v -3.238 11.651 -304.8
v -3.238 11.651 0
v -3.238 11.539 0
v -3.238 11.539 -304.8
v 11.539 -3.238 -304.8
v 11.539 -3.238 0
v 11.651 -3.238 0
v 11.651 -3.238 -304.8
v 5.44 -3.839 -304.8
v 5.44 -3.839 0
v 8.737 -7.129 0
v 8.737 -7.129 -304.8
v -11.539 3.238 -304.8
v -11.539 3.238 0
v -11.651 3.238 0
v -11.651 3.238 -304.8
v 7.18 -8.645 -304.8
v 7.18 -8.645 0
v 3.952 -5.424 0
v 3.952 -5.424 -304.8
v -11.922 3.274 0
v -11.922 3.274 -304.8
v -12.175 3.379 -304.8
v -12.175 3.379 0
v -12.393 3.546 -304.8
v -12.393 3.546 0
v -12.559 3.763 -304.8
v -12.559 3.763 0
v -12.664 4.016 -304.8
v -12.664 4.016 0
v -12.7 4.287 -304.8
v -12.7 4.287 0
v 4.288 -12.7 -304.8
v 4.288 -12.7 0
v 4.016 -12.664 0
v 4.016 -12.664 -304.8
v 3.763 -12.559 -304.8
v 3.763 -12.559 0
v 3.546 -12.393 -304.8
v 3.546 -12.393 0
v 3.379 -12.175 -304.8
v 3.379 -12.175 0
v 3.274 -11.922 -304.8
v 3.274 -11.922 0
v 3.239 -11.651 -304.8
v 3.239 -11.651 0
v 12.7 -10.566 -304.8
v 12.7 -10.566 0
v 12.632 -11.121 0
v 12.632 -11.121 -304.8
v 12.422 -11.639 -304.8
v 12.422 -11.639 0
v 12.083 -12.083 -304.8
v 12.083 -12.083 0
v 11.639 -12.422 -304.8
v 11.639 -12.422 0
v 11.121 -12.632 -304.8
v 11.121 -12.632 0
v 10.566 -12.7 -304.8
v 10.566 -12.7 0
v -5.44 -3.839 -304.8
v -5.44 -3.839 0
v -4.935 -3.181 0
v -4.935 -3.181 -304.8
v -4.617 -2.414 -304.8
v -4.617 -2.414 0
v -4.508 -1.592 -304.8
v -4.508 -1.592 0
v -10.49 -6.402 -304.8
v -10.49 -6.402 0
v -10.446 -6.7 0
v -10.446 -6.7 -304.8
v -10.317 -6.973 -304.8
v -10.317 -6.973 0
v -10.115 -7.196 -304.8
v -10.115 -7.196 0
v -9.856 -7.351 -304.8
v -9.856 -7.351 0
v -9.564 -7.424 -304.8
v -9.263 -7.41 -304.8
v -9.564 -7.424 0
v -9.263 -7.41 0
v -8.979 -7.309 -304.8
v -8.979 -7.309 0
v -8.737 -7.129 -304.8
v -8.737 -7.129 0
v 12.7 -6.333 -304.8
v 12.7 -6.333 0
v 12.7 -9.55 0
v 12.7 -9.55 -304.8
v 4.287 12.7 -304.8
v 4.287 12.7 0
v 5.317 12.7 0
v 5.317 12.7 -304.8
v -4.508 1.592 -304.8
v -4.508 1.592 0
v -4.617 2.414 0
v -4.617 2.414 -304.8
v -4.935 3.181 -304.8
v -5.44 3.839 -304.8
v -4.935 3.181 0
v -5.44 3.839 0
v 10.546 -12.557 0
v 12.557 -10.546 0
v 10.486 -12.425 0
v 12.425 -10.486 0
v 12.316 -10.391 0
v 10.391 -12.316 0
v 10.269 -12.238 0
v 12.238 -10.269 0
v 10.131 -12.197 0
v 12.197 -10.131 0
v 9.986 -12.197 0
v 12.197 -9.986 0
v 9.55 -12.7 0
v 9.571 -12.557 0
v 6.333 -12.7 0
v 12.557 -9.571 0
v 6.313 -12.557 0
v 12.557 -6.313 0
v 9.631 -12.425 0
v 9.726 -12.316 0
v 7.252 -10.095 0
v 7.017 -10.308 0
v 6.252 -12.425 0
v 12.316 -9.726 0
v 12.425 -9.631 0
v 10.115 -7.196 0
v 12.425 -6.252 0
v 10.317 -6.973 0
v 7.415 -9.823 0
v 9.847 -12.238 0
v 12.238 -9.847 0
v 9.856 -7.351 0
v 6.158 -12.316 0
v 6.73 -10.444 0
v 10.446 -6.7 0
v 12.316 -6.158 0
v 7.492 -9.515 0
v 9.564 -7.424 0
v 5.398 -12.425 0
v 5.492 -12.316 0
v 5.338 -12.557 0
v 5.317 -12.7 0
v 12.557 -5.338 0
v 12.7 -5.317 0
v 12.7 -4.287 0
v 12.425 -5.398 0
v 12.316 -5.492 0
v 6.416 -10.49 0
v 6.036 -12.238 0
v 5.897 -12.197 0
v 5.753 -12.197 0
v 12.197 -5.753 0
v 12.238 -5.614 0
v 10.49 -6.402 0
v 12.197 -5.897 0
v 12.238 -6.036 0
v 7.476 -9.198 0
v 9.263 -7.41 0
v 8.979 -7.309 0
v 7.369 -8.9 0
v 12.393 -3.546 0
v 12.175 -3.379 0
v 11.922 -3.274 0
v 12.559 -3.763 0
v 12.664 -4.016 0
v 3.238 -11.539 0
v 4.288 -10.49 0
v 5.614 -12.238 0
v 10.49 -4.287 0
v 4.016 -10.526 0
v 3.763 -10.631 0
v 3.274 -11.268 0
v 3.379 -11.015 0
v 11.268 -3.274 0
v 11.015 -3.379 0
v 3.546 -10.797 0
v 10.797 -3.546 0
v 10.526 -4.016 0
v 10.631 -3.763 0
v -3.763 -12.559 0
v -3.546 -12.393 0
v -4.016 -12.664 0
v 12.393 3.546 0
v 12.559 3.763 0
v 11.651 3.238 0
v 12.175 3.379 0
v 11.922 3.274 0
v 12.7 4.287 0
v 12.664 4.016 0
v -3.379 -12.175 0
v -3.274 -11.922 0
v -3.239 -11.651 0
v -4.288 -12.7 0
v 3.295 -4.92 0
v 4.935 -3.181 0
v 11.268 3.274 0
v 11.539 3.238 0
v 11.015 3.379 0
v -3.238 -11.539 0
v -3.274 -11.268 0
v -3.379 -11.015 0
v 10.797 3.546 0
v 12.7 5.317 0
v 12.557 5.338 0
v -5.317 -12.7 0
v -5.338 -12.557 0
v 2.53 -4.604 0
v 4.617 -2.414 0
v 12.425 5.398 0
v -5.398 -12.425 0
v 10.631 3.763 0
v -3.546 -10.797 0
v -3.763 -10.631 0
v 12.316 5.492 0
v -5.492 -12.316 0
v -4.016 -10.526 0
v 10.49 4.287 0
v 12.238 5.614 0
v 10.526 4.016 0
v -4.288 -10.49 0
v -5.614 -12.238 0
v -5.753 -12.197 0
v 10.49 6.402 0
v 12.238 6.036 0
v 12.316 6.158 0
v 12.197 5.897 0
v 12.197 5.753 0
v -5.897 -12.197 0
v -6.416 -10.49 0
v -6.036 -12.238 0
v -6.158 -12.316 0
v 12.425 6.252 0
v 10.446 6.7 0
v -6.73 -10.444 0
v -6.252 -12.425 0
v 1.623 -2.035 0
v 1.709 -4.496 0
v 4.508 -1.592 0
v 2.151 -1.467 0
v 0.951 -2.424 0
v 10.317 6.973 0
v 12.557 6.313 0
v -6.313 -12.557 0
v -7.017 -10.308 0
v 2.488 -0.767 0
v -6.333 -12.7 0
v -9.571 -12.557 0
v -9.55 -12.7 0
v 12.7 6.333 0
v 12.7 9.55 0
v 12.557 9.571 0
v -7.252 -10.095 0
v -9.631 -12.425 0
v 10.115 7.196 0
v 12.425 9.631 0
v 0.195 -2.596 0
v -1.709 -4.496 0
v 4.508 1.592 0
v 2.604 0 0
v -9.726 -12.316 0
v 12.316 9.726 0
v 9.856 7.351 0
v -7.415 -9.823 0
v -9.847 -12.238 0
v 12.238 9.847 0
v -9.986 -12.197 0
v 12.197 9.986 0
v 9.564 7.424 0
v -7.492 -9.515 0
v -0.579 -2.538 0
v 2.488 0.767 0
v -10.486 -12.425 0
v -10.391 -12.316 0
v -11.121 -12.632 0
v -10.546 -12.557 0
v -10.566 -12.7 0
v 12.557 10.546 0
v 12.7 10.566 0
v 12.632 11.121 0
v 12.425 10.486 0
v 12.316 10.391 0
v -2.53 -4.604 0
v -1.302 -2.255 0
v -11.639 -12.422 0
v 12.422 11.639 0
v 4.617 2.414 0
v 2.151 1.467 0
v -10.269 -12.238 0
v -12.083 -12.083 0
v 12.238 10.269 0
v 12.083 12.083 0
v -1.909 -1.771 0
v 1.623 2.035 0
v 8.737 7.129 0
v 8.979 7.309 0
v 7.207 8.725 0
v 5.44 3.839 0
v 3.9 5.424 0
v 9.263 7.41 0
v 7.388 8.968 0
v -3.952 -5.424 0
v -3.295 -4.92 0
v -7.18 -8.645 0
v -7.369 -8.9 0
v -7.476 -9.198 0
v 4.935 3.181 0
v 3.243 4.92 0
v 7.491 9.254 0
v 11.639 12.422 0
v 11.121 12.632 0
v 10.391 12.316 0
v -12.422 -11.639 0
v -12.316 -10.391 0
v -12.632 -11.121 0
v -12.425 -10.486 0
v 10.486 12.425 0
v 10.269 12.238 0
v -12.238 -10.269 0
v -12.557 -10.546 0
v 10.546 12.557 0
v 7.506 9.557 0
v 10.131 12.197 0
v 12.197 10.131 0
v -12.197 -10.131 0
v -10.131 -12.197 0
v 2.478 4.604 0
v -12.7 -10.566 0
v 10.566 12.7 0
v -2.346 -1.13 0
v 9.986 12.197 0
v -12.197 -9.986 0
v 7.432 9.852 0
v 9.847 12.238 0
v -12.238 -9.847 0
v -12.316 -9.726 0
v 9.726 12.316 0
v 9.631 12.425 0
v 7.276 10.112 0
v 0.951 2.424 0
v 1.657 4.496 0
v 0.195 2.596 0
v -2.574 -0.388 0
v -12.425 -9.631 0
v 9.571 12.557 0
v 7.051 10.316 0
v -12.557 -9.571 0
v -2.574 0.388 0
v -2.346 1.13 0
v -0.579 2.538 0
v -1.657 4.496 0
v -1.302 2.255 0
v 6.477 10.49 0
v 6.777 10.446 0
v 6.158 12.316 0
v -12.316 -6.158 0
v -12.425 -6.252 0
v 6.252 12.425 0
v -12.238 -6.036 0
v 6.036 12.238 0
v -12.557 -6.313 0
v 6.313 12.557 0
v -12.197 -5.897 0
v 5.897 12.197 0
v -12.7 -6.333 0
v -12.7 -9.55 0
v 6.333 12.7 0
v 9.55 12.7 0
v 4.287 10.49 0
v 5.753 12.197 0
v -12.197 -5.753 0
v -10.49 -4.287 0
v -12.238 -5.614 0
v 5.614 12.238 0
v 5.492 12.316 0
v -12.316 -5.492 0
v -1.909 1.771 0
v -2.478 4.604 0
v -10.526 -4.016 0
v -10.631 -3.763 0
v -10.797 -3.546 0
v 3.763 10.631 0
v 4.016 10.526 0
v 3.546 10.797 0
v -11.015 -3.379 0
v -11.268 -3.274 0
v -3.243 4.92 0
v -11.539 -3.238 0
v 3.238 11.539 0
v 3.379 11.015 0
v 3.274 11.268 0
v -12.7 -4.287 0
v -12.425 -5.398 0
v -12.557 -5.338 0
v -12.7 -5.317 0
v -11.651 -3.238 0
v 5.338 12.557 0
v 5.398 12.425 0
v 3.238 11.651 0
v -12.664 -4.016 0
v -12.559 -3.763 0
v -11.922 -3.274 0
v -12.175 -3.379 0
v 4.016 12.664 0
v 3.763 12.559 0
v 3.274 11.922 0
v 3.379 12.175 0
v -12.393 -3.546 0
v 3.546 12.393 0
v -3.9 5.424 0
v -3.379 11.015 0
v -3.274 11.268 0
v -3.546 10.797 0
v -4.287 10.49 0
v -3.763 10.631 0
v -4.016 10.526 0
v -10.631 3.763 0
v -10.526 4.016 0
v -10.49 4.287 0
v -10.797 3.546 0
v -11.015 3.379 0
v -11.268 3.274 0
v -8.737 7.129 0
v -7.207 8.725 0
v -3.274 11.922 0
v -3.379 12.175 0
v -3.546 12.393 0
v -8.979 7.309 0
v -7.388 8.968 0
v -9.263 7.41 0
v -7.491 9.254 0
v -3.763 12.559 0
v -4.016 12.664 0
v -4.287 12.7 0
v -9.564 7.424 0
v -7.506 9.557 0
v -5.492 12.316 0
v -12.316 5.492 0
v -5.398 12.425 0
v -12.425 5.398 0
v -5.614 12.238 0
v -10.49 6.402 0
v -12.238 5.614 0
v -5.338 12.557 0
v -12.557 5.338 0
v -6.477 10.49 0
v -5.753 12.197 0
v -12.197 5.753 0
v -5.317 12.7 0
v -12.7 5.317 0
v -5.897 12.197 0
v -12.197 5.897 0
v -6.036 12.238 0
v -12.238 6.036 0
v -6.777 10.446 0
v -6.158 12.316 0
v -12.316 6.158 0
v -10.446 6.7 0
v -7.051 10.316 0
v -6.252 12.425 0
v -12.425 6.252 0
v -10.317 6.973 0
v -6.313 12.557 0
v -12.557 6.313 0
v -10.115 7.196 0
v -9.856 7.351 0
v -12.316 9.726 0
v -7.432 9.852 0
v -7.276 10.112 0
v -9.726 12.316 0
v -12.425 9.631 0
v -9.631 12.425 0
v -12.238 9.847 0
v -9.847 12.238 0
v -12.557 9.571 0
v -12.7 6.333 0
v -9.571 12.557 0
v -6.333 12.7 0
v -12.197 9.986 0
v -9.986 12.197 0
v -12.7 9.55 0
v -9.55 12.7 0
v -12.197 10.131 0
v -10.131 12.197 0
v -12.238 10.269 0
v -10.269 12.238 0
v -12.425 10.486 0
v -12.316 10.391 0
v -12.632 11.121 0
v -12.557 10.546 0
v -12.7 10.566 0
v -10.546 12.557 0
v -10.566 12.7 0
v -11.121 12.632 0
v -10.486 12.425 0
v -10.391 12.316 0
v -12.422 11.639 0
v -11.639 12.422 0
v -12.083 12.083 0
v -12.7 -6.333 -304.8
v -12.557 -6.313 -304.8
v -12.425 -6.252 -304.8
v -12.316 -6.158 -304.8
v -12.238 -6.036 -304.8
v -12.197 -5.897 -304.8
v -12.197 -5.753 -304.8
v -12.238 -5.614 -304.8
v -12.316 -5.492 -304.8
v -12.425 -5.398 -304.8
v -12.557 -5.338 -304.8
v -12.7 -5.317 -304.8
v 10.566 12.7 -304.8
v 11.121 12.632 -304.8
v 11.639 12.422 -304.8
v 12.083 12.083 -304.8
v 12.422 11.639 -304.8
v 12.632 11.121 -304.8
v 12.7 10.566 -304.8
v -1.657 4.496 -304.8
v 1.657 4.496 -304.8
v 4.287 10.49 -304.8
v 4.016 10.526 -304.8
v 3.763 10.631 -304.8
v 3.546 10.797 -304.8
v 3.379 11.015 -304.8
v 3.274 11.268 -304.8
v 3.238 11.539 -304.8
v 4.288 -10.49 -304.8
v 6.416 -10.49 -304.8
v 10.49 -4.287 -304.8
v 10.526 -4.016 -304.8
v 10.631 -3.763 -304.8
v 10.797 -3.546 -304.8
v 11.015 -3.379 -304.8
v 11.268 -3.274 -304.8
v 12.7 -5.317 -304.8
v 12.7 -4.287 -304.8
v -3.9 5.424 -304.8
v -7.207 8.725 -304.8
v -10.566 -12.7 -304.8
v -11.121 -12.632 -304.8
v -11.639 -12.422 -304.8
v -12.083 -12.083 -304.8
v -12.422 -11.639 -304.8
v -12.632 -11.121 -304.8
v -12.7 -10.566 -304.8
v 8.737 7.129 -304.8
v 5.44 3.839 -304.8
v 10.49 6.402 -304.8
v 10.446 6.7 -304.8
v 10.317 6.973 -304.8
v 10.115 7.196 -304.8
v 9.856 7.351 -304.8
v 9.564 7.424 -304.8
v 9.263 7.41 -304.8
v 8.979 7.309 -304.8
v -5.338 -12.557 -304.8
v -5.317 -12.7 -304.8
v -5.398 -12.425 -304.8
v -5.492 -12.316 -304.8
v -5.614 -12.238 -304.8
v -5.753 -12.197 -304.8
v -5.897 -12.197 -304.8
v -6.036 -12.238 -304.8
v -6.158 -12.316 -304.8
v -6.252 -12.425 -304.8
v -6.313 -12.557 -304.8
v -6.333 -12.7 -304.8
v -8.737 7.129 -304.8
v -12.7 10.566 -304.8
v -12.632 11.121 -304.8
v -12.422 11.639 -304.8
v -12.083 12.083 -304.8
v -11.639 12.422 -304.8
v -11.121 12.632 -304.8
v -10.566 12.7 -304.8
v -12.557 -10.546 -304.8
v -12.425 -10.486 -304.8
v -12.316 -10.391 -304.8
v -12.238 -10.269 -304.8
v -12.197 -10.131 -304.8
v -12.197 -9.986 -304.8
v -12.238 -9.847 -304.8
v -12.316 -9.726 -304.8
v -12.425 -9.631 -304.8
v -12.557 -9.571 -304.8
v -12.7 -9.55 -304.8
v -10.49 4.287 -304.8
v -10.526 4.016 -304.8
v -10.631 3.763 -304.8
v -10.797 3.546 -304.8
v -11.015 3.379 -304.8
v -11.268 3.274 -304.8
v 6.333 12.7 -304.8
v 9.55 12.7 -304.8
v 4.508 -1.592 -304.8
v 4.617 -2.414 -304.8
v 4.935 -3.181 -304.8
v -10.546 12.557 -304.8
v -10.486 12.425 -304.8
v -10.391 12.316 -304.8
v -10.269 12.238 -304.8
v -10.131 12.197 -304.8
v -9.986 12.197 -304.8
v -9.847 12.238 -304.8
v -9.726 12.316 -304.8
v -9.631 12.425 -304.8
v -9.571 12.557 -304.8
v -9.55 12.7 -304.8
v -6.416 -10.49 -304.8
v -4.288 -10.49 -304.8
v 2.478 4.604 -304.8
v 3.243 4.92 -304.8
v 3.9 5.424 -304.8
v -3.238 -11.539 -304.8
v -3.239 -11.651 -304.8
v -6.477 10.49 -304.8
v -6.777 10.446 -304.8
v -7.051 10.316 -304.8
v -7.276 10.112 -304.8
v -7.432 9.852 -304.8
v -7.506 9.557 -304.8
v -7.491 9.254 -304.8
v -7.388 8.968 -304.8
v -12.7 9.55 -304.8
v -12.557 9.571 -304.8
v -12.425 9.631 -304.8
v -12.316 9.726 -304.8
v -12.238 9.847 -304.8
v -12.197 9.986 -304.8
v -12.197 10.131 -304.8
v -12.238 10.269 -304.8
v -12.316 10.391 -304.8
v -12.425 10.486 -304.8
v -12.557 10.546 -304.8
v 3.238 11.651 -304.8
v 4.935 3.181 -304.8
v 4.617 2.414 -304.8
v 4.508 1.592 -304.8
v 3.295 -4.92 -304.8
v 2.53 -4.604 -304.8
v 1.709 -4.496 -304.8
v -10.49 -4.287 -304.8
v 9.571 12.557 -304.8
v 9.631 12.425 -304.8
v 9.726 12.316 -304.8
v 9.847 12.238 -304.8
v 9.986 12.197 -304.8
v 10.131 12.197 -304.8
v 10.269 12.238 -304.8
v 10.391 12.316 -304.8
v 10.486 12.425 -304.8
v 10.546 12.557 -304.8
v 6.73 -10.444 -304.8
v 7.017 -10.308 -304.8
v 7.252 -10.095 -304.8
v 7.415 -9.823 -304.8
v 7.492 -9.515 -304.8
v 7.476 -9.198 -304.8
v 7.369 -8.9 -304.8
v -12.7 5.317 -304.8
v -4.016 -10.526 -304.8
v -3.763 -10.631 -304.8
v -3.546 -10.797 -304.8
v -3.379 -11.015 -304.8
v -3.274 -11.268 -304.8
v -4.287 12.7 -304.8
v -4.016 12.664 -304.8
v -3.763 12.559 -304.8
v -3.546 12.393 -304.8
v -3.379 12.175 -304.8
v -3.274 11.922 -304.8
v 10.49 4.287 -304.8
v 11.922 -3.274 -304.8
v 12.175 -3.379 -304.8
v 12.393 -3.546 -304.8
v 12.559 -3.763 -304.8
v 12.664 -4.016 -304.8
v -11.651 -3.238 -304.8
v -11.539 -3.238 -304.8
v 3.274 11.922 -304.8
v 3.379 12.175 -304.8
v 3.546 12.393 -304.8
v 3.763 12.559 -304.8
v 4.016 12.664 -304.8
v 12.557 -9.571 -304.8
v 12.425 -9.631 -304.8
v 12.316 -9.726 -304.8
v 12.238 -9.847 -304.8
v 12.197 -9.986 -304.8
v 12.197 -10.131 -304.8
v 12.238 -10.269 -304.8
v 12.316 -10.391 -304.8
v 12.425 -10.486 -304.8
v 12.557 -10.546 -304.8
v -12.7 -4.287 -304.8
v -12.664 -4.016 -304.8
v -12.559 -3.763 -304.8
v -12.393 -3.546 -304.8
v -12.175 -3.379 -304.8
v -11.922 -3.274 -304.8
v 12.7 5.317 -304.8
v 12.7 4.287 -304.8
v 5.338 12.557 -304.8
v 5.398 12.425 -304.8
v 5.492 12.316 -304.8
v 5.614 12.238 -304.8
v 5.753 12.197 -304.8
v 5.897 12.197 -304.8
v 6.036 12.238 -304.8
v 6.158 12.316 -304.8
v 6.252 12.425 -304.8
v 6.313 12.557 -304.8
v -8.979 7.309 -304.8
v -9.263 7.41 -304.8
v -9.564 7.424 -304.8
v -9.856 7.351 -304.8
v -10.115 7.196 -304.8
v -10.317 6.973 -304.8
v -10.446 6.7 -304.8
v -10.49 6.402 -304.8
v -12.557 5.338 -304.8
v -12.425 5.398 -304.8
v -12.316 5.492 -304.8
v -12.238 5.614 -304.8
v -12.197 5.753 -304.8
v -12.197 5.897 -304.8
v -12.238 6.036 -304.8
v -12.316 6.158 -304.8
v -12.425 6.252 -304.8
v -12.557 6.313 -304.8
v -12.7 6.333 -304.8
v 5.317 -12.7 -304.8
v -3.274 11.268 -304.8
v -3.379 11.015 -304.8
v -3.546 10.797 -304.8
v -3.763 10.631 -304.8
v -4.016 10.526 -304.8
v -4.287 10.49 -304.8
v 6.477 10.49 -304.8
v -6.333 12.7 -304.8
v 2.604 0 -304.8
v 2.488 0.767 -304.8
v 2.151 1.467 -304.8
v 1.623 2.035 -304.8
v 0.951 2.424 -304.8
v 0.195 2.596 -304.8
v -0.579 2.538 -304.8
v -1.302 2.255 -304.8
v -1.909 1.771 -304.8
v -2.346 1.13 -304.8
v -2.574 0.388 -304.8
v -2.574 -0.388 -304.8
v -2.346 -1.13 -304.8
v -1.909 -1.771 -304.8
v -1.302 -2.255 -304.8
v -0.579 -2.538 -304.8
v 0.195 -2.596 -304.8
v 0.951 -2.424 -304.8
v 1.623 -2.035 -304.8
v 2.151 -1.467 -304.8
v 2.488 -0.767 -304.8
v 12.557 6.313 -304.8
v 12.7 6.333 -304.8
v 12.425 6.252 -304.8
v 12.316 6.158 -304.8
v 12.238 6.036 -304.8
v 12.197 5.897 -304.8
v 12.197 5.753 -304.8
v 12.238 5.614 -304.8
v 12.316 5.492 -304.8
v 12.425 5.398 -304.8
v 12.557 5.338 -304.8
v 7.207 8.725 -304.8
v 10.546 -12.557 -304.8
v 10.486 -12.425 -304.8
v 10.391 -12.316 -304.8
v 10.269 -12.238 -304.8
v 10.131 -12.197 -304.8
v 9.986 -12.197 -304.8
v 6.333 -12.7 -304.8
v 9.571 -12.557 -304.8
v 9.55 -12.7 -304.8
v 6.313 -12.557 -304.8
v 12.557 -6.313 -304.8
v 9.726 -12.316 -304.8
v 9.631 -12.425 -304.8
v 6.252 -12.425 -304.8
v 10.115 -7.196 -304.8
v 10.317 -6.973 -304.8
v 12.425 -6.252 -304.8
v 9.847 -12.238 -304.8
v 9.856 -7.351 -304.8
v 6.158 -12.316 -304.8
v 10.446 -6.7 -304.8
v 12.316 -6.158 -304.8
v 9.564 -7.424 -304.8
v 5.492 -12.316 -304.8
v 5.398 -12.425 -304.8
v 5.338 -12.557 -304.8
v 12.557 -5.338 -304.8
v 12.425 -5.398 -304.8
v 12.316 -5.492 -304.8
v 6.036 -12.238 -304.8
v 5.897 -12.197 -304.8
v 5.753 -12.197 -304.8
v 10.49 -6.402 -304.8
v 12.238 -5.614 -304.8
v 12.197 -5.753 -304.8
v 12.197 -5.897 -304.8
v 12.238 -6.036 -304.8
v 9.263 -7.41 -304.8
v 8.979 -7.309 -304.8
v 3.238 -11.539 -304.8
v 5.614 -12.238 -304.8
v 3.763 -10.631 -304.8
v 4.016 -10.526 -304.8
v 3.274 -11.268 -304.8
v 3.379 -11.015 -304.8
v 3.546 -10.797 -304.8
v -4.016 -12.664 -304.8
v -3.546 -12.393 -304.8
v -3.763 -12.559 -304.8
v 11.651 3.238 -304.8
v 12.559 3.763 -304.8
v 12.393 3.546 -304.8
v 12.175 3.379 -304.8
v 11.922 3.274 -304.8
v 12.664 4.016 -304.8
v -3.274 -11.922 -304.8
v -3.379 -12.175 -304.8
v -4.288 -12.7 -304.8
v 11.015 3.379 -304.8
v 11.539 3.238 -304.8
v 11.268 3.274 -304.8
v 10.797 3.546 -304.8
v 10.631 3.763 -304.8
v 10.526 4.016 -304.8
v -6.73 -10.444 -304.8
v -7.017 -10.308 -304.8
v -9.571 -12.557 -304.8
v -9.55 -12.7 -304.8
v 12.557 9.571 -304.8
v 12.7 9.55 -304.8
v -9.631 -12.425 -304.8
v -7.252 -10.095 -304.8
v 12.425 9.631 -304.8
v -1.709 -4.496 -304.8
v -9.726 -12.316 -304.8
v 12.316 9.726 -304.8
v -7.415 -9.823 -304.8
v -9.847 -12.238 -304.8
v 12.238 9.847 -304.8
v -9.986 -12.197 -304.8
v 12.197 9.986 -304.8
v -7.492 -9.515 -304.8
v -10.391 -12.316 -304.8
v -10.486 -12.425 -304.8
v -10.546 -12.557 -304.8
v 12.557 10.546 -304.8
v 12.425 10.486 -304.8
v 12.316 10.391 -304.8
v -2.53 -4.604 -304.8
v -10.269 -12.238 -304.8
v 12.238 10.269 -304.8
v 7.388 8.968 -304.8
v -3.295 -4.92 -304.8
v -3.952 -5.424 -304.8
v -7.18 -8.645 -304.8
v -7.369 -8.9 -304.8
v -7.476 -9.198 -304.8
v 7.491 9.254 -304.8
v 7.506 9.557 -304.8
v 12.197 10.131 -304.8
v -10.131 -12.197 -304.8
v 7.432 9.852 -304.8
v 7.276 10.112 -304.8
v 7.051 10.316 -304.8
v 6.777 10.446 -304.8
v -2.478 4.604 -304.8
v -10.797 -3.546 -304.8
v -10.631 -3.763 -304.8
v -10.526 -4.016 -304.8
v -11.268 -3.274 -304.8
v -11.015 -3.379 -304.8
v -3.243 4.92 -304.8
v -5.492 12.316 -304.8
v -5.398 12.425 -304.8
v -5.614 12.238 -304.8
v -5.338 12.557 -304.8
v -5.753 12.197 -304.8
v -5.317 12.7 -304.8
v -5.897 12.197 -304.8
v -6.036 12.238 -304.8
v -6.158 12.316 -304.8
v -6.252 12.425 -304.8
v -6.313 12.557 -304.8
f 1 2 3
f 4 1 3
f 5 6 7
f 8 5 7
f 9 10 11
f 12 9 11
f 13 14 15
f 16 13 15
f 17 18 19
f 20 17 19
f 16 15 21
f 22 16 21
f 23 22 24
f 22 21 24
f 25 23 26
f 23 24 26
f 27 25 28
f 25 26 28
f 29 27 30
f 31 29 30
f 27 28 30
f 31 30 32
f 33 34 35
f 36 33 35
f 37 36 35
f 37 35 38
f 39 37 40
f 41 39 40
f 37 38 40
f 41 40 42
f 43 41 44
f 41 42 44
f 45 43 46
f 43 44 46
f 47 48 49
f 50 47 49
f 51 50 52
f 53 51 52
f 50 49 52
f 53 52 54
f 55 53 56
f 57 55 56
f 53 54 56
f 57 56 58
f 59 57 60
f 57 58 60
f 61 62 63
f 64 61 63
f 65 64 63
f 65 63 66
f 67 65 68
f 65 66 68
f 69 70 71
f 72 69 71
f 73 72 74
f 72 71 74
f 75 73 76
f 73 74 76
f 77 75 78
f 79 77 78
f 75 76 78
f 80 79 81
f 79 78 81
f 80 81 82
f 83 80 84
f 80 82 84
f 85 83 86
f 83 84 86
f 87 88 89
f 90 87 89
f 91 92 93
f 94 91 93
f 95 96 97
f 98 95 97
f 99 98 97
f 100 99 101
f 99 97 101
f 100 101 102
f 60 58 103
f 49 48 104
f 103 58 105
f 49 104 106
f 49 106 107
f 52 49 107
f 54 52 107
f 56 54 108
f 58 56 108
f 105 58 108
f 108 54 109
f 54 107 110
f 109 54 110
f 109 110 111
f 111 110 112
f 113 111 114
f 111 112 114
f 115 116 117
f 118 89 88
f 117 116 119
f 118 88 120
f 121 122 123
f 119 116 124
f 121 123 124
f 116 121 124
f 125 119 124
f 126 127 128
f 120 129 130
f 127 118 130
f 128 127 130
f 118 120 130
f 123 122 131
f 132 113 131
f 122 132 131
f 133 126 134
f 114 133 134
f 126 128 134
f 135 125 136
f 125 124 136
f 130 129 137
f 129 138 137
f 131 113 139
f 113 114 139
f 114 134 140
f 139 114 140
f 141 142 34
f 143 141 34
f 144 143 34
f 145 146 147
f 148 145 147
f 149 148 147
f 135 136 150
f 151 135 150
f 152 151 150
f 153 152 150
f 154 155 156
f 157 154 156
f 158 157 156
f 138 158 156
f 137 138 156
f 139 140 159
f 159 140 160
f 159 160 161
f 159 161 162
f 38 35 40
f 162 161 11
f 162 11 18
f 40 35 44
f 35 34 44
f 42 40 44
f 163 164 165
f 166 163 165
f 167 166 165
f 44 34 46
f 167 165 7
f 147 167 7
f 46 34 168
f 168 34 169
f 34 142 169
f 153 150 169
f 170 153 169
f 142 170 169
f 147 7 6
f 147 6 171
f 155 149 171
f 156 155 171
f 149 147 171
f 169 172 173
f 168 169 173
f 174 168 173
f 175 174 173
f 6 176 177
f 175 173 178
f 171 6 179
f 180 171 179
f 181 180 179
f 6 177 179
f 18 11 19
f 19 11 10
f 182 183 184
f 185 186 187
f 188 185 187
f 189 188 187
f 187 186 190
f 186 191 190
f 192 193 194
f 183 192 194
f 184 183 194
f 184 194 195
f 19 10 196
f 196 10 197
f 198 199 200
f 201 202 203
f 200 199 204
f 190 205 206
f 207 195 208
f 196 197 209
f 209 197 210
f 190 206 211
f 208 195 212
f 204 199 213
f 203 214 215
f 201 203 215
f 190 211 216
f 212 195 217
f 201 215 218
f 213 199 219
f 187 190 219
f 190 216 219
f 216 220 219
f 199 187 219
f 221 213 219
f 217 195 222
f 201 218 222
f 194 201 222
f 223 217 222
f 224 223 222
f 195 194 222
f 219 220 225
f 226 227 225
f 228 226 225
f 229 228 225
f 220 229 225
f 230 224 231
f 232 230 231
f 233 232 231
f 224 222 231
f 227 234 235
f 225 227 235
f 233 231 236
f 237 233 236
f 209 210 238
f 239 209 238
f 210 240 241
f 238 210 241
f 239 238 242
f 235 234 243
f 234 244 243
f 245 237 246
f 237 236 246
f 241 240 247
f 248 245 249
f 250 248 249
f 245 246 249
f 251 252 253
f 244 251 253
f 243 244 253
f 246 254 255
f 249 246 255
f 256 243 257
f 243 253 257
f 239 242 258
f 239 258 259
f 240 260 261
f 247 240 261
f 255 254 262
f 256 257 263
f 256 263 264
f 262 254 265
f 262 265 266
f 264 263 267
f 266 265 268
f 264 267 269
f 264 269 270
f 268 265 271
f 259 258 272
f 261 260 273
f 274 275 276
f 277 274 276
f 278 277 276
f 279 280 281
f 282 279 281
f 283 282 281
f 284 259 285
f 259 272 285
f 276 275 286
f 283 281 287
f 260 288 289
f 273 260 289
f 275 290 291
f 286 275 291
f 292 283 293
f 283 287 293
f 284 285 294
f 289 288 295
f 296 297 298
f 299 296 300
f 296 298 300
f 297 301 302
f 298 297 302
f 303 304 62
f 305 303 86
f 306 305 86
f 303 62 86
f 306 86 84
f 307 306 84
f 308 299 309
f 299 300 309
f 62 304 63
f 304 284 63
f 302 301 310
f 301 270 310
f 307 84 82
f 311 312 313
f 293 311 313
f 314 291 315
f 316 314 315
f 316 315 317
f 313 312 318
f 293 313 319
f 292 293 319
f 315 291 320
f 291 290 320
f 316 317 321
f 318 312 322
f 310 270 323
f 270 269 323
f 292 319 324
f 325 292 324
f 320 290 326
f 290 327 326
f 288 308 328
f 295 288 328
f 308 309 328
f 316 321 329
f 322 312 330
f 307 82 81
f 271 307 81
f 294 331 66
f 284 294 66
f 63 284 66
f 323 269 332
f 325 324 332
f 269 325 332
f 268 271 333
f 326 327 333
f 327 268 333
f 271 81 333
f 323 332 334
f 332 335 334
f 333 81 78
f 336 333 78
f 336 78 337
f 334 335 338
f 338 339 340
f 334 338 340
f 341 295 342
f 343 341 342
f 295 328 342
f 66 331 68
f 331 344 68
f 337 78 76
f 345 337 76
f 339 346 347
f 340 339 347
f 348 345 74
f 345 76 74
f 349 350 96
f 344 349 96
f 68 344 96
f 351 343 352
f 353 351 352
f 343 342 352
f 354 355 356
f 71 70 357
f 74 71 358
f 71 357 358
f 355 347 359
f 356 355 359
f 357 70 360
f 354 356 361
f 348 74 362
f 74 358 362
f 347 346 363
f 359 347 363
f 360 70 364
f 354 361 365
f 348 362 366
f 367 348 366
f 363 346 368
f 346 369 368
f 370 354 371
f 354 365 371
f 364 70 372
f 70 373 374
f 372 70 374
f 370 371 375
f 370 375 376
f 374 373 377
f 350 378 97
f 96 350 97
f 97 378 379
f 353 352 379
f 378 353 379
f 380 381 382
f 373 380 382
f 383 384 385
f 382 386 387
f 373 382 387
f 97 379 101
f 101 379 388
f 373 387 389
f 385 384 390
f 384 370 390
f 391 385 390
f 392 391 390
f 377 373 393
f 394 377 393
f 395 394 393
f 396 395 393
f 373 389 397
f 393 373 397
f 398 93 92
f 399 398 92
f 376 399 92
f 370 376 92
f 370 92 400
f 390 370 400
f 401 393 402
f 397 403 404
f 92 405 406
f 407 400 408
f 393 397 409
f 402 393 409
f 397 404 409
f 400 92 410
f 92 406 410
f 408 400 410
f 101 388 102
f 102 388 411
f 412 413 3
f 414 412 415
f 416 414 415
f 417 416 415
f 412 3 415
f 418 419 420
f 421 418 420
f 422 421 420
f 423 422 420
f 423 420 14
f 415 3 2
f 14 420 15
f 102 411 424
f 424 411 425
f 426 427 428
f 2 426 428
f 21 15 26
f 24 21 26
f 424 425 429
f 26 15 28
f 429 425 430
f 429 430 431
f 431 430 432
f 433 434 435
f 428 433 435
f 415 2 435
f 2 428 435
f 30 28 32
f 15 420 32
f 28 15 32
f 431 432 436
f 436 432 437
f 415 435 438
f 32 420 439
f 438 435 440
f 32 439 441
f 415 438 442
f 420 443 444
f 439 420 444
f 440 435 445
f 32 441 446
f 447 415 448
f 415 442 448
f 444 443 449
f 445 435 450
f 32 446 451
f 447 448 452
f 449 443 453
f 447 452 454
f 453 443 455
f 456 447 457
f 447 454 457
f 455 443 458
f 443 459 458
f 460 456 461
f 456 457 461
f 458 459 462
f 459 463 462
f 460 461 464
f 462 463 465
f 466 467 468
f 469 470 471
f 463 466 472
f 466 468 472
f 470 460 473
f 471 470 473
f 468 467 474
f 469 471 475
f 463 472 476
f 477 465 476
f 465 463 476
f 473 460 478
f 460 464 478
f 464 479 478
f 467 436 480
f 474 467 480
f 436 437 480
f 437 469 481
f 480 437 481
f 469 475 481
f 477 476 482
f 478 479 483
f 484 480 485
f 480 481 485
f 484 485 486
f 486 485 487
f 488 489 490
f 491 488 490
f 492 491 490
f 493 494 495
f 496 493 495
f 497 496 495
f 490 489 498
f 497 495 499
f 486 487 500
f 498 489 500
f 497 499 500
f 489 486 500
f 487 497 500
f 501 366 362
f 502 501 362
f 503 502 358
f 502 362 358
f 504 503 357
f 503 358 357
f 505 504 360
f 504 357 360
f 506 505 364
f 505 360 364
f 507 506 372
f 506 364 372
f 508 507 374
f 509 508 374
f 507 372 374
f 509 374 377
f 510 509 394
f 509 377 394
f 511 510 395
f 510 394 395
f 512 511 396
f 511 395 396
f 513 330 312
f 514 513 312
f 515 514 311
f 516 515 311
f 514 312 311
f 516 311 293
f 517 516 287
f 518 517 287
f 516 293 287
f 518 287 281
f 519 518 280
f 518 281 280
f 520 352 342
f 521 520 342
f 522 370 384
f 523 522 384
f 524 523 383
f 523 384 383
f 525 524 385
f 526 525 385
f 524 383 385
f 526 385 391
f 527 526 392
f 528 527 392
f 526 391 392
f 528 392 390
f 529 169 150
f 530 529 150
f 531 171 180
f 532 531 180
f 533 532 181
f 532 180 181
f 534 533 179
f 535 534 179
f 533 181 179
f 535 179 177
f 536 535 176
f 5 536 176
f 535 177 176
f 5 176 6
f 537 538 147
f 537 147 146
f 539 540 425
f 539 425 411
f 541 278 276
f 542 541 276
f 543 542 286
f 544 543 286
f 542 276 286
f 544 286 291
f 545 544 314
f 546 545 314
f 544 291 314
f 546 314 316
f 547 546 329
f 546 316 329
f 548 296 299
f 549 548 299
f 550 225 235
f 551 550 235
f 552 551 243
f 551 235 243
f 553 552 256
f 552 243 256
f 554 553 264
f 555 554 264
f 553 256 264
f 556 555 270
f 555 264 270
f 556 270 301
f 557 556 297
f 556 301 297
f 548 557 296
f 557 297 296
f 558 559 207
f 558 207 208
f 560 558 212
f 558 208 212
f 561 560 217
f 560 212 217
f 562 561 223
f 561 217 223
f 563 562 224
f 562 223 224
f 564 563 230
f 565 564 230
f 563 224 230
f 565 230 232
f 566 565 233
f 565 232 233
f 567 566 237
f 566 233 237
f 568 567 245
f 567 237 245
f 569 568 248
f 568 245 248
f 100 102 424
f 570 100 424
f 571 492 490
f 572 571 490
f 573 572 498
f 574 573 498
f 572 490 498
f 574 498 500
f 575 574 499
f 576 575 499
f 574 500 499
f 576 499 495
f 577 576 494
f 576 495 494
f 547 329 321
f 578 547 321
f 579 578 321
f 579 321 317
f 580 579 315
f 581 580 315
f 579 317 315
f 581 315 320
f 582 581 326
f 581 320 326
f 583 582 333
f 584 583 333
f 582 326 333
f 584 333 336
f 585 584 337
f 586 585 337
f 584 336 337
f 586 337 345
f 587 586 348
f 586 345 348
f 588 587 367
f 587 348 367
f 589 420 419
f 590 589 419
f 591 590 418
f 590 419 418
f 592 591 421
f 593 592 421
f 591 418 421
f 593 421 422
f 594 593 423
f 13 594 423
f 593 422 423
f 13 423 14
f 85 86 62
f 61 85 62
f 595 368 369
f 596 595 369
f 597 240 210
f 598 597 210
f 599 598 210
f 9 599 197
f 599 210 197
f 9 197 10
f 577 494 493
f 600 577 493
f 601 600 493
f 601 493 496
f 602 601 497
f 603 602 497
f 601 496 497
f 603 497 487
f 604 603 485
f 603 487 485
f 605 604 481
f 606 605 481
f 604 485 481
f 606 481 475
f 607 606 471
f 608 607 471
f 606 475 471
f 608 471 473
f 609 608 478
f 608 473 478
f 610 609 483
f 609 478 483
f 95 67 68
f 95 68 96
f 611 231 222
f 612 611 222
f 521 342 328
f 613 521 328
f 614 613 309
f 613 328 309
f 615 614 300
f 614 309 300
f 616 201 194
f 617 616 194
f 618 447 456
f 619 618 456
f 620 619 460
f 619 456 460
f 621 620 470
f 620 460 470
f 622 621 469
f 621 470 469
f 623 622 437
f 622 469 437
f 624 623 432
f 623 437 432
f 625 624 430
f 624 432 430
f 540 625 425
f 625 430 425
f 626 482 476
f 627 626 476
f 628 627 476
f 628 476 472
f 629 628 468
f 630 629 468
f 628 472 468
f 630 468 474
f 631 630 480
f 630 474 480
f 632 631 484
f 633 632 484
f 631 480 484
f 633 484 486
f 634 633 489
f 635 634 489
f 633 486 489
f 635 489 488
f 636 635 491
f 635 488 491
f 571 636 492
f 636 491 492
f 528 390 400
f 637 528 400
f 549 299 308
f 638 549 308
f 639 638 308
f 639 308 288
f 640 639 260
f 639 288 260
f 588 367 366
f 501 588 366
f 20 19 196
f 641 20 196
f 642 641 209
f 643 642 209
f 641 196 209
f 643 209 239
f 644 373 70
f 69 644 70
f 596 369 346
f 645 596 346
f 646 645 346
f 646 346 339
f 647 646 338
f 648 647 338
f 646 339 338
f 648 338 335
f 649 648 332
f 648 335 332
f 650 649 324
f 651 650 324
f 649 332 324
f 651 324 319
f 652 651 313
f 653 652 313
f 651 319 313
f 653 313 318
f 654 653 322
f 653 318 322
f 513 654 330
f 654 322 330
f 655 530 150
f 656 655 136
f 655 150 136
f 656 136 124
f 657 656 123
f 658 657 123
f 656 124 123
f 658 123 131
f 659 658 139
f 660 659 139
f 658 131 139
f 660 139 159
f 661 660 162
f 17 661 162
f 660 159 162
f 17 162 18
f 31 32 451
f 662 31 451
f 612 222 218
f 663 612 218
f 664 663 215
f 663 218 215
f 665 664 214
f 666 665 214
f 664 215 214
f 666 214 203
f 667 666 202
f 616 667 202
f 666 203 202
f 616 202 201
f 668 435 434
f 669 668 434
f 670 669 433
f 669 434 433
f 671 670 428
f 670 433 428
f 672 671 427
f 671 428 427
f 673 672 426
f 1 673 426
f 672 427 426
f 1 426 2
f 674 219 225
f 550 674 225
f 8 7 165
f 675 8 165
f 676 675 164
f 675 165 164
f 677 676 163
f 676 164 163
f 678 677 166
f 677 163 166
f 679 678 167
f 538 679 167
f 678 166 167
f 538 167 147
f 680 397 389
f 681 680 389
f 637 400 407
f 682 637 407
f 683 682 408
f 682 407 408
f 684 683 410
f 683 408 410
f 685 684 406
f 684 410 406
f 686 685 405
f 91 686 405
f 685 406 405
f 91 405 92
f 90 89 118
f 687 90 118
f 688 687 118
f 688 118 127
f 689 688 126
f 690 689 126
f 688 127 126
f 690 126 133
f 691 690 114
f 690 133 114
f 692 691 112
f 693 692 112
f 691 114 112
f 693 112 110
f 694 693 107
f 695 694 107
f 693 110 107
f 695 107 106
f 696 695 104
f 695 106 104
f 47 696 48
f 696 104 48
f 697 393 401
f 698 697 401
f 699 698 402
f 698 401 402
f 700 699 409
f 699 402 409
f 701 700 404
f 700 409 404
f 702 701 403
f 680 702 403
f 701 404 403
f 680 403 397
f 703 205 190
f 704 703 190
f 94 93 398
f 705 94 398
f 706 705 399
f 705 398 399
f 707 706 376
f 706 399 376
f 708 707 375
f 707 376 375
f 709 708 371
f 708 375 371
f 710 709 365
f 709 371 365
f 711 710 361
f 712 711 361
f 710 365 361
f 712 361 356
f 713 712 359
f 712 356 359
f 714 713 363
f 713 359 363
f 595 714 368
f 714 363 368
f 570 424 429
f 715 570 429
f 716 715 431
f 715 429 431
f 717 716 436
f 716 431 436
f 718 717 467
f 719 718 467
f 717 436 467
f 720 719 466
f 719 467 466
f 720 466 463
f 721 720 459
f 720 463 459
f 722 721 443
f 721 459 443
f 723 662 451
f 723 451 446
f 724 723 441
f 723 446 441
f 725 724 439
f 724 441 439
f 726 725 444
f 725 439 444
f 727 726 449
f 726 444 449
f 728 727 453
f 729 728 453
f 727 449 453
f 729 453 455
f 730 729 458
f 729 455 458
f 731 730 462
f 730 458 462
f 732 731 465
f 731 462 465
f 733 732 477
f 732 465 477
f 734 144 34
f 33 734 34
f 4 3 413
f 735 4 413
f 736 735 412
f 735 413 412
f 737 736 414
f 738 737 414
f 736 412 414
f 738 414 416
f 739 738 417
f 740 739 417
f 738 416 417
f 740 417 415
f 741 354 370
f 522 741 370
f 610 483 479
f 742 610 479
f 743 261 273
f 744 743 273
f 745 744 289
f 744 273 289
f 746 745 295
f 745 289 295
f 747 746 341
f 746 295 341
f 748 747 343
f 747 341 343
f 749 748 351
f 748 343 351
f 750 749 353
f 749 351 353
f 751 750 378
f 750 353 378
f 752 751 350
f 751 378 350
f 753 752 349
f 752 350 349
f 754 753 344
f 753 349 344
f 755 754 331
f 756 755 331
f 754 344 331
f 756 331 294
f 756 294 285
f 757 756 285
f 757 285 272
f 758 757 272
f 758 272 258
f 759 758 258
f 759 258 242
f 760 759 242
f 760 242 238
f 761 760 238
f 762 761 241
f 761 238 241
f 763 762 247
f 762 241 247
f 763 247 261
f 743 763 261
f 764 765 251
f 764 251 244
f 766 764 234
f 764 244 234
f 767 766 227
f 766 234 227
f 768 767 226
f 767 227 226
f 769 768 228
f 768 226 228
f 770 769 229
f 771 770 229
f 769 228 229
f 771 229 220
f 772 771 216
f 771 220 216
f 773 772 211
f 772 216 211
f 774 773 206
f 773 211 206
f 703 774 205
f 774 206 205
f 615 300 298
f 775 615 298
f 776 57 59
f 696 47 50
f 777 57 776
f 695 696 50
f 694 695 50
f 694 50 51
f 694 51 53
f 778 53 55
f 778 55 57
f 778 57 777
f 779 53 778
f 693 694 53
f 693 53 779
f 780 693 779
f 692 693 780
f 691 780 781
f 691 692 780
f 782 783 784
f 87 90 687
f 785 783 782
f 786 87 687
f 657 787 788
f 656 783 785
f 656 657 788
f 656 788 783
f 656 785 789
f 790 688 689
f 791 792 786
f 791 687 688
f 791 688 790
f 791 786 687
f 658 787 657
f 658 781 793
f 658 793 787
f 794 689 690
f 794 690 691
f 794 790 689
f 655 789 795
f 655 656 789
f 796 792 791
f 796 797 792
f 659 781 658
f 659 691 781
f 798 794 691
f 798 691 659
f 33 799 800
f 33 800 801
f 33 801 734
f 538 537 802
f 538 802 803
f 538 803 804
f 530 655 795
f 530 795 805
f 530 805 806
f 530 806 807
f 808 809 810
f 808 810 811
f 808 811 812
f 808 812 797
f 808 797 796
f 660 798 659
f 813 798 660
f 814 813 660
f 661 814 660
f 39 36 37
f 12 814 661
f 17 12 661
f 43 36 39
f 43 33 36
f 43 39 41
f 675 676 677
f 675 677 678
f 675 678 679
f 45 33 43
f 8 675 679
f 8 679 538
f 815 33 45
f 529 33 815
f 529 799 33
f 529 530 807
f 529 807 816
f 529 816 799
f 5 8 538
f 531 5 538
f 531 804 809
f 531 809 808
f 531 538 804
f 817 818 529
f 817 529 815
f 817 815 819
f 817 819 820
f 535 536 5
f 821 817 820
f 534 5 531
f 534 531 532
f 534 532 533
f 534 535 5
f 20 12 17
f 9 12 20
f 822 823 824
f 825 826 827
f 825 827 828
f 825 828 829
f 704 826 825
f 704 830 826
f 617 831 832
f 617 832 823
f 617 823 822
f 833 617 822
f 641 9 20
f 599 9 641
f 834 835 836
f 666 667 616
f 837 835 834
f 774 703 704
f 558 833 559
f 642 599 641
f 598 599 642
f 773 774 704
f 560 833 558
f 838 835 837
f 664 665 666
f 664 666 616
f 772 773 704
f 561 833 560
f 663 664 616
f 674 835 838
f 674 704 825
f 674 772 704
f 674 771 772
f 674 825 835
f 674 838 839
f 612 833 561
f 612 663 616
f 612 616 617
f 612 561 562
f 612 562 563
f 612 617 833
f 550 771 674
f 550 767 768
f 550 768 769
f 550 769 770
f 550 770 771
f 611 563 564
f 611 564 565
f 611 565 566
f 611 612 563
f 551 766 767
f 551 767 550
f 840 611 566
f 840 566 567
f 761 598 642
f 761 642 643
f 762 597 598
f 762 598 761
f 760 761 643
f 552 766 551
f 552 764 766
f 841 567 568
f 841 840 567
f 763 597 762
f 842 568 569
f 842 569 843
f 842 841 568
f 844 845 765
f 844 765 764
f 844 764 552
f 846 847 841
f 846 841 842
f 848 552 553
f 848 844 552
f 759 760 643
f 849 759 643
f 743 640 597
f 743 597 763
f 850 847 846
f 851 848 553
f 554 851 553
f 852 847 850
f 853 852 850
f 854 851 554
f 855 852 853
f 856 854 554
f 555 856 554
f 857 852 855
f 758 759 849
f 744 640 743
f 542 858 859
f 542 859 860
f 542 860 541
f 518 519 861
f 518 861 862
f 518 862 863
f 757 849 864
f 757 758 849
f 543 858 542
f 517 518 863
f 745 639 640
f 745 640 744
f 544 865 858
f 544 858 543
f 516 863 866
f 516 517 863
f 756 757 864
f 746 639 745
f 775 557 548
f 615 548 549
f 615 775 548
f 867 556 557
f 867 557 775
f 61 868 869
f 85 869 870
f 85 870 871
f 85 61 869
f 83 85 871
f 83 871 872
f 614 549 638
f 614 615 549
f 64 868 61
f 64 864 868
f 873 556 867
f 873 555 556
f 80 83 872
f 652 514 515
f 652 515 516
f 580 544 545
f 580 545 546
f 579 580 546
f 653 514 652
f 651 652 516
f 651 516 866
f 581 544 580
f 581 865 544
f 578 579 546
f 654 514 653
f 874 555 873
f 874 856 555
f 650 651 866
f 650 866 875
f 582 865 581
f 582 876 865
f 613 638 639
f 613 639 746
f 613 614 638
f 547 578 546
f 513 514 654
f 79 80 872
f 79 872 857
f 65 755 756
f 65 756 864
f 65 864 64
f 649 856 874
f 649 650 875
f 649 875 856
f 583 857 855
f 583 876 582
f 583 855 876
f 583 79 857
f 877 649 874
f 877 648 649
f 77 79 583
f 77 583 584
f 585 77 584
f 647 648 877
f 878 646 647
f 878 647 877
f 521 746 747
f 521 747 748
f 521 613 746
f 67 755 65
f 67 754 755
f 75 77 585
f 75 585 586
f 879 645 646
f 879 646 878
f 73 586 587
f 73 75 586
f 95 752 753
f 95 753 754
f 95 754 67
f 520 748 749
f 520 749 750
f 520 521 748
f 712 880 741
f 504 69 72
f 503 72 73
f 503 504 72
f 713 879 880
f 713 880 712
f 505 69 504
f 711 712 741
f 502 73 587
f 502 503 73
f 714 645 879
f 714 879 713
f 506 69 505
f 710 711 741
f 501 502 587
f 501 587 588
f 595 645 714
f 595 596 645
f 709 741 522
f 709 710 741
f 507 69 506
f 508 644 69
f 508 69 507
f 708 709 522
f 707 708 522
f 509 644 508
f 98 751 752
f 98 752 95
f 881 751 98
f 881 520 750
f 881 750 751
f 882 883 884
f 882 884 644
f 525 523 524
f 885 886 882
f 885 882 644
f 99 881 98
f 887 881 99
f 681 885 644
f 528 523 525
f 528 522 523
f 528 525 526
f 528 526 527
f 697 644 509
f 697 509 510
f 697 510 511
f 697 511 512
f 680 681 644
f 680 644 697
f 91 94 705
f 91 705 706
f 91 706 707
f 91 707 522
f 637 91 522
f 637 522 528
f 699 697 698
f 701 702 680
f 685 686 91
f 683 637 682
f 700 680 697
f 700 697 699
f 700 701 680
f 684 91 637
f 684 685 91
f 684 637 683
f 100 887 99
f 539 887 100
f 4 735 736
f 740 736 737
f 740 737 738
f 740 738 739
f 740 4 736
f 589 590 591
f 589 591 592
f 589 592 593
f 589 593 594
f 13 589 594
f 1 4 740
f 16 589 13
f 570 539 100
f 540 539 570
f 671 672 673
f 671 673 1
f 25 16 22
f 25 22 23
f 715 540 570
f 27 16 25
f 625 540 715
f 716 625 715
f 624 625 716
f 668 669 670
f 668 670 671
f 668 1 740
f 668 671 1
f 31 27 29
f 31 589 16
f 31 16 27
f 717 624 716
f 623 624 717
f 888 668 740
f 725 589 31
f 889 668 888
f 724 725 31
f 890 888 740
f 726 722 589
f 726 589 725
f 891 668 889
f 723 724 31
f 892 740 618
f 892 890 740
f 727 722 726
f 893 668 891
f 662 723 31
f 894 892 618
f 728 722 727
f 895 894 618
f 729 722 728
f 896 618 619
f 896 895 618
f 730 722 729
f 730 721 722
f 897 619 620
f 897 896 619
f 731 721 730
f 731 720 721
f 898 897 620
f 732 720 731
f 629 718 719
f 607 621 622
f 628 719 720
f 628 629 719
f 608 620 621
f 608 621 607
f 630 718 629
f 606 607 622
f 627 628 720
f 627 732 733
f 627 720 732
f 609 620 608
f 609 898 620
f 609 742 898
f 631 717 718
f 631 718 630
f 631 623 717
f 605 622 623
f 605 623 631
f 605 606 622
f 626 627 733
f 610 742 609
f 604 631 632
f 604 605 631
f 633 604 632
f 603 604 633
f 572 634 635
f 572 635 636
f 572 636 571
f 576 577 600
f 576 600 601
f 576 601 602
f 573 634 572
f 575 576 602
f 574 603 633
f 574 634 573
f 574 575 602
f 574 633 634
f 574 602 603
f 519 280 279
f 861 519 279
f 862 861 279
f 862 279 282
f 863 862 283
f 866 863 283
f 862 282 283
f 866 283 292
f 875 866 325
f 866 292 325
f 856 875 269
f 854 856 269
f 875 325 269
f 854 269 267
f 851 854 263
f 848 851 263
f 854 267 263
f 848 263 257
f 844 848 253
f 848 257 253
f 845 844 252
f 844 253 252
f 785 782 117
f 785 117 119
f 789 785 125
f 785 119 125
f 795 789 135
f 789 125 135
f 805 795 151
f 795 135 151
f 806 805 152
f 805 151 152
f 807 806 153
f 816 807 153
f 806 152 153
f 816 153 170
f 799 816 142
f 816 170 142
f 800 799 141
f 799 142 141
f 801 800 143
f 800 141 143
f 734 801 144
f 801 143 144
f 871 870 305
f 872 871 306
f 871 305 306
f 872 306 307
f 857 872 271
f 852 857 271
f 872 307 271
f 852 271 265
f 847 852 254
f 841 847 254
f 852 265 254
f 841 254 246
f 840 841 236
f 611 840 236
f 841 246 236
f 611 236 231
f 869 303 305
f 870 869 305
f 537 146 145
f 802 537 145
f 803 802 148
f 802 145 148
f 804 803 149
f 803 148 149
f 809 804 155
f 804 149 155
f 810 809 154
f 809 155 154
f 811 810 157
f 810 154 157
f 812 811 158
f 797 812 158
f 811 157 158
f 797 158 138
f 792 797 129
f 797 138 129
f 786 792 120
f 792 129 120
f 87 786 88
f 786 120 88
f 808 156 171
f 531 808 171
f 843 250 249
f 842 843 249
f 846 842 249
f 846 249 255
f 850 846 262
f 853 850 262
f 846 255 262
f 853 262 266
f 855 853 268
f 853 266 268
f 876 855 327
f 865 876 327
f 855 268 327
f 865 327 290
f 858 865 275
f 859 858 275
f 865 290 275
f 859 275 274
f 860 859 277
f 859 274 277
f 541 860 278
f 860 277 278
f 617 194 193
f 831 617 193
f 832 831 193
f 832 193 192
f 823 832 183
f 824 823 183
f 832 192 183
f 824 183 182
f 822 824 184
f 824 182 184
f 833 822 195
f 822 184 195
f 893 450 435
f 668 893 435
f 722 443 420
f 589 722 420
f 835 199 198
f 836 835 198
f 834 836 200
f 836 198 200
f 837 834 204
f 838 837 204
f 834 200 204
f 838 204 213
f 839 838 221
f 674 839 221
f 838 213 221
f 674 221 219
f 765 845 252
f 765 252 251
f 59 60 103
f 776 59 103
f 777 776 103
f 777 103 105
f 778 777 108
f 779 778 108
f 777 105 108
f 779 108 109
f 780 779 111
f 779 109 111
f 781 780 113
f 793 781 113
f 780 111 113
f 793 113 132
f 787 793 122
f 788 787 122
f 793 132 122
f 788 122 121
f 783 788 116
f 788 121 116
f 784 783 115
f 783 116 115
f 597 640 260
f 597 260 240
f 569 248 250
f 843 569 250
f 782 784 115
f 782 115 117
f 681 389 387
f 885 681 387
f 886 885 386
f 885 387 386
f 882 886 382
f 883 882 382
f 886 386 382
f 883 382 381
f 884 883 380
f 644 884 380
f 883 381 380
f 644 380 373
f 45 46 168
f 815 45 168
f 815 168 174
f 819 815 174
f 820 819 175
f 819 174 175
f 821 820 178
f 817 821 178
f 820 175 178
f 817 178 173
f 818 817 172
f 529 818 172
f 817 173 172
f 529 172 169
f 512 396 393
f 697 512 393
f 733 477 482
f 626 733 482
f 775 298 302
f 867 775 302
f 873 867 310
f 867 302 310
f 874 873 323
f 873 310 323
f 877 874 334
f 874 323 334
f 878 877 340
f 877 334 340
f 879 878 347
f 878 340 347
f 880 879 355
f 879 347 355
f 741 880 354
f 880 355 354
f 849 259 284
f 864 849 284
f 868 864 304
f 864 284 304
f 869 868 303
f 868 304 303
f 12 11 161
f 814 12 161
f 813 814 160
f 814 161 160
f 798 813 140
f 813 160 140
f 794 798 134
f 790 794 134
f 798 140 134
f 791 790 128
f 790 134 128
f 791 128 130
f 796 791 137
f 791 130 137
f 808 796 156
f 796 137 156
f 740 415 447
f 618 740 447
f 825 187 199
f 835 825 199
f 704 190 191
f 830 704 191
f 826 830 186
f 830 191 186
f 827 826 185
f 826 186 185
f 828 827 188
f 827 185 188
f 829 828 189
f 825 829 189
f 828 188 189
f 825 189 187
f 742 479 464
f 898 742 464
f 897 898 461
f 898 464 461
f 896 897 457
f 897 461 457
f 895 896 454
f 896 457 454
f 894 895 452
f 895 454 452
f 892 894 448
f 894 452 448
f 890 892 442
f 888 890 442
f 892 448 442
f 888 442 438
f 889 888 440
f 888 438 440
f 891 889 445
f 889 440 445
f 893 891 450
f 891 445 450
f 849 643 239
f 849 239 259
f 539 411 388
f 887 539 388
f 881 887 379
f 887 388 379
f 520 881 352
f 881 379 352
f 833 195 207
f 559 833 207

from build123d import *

# Parameters (mm, degrees)
SKETCH1_R      = 2.6035
EXTRUDE1_DEPTH = 304.8


with BuildPart() as part:
    # Sketch1 → Extrude1 (new body)
    with BuildSketch(Plane.XY):
        with BuildLine():
            Line((-7.207191475, 8.724540082), (-3.900315394, 5.423689619))
            ThreePointArc((-3.900315394, 5.423689619), (-2.8709819, 4.736928798), (-1.657299581, 4.4958))
            Line((-1.657299581, 4.4958), (1.657299581, 4.4958))
            ThreePointArc((1.657299581, 4.4958), (2.8709819, 4.736928798), (3.900315394, 5.423689619))
            Line((3.900315394, 5.423689619), (7.207191475, 8.724540082))
            ThreePointArc((7.207191475, 8.724540082), (7.43216212, 9.851515102), (6.476774195, 10.4902))
            Line((6.476774195, 10.4902), (4.2874692, 10.4902))
            ThreePointArc((4.2874692, 10.4902), (3.545700044, 10.797450844), (3.2384492, 11.53922))
            Line((3.2384492, 11.53922), (3.2384492, 11.65098))
            ThreePointArc((3.2384492, 11.65098), (3.545700044, 12.392749156), (4.2874692, 12.7))
            Line((4.2874692, 12.7), (5.3170836, 12.7))
            ThreePointArc((5.3170836, 12.7), (5.8250836, 12.192), (6.3330836, 12.7))
            Line((6.3330836, 12.7), (9.5504, 12.7))
            ThreePointArc((9.5504, 12.7), (10.058323491, 12.192000006), (10.566399977, 12.699846982))
            ThreePointArc((10.566399977, 12.699846982), (12.082522516, 12.082522516), (12.699846982, 10.566399977))
            ThreePointArc((12.699846982, 10.566399977), (12.192000006, 10.058323491), (12.7, 9.5504))
            Line((12.7, 9.5504), (12.7, 6.3331344))
            ThreePointArc((12.7, 6.3331344), (12.192, 5.8251344), (12.7, 5.3171344))
            Line((12.7, 5.3171344), (12.7, 4.287470133))
            ThreePointArc((12.7, 4.287470133), (12.392749156, 3.545700977), (11.65098, 3.238450133))
            Line((11.65098, 3.238450133), (11.53922, 3.238450133))
            ThreePointArc((11.53922, 3.238450133), (10.797450844, 3.545700977), (10.4902, 4.287470133))
            Line((10.4902, 4.287470133), (10.4902, 6.402089023))
            ThreePointArc((10.4902, 6.402089023), (9.856394933, 7.351113629), (8.736962546, 7.129240479))
            Line((8.736962546, 7.129240479), (5.440484187, 3.838768792))
            ThreePointArc((5.440484187, 3.838768792), (4.75073678, 2.808015636), (4.5085, 1.591658411))
            Line((4.5085, 1.591658411), (4.5085, -1.591658411))
            ThreePointArc((4.5085, -1.591658411), (4.75073678, -2.808015636), (5.440484187, -3.838768792))
            Line((5.440484187, -3.838768792), (8.736962546, -7.129240479))
            ThreePointArc((8.736962546, -7.129240479), (9.856394933, -7.351113629), (10.4902, -6.402089023))
            Line((10.4902, -6.402089023), (10.4902, -4.287470133))
            ThreePointArc((10.4902, -4.287470133), (10.797450844, -3.545700977), (11.53922, -3.238450133))
            Line((11.53922, -3.238450133), (11.65098, -3.238450133))
            ThreePointArc((11.65098, -3.238450133), (12.392749156, -3.545700977), (12.7, -4.287470133))
            Line((12.7, -4.287470133), (12.7, -5.3170836))
            ThreePointArc((12.7, -5.3170836), (12.192, -5.8250836), (12.7, -6.3330836))
            Line((12.7, -6.3330836), (12.7, -9.5504))
            ThreePointArc((12.7, -9.5504), (12.192000006, -10.058323491), (12.699846982, -10.566399977))
            ThreePointArc((12.699846982, -10.566399977), (12.082522516, -12.082522516), (10.566399977, -12.699846982))
            ThreePointArc((10.566399977, -12.699846982), (10.058323491, -12.192000006), (9.5504, -12.7))
            Line((9.5504, -12.7), (6.3331344, -12.7))
            ThreePointArc((6.3331344, -12.7), (5.8251344, -12.192), (5.3171344, -12.7))
            Line((5.3171344, -12.7), (4.28752, -12.7))
            ThreePointArc((4.28752, -12.7), (3.545750844, -12.392749156), (3.2385, -11.65098))
            Line((3.2385, -11.65098), (3.2385, -11.53922))
            ThreePointArc((3.2385, -11.53922), (3.545750844, -10.797450844), (4.28752, -10.4902))
            Line((4.28752, -10.4902), (6.41641086, -10.4902))
            ThreePointArc((6.41641086, -10.4902), (7.414733441, -9.822812921), (7.179652728, -8.645192207))
            Line((7.179652728, -8.645192207), (3.95226937, -5.423689619))
            ThreePointArc((3.95226937, -5.423689619), (2.922935876, -4.736928798), (1.709253557, -4.4958))
            Line((1.709253557, -4.4958), (-1.709253557, -4.4958))
            ThreePointArc((-1.709253557, -4.4958), (-2.922935876, -4.736928798), (-3.95226937, -5.423689619))
            Line((-3.95226937, -5.423689619), (-7.179652728, -8.645192207))
            ThreePointArc((-7.179652728, -8.645192207), (-7.414733441, -9.822812921), (-6.41641086, -10.4902))
            Line((-6.41641086, -10.4902), (-4.28752, -10.4902))
            ThreePointArc((-4.28752, -10.4902), (-3.545750844, -10.797450844), (-3.2385, -11.53922))
            Line((-3.2385, -11.53922), (-3.2385, -11.65098))
            ThreePointArc((-3.2385, -11.65098), (-3.545750844, -12.392749156), (-4.28752, -12.7))
            Line((-4.28752, -12.7), (-5.3171344, -12.7))
            ThreePointArc((-5.3171344, -12.7), (-5.8251344, -12.192), (-6.3331344, -12.7))
            Line((-6.3331344, -12.7), (-9.5504, -12.7))
            ThreePointArc((-9.5504, -12.7), (-10.058323491, -12.192000006), (-10.566399977, -12.699846982))
            ThreePointArc((-10.566399977, -12.699846982), (-12.082522516, -12.082522516), (-12.699846982, -10.566399977))
            ThreePointArc((-12.699846982, -10.566399977), (-12.192000006, -10.058323491), (-12.7, -9.5504))
            Line((-12.7, -9.5504), (-12.7, -6.3330836))
            ThreePointArc((-12.7, -6.3330836), (-12.192, -5.8250836), (-12.7, -5.3170836))
            Line((-12.7, -5.3170836), (-12.7, -4.287470133))
            ThreePointArc((-12.7, -4.287470133), (-12.392749156, -3.545700977), (-11.65098, -3.238450133))
            Line((-11.65098, -3.238450133), (-11.53922, -3.238450133))
            ThreePointArc((-11.53922, -3.238450133), (-10.797450844, -3.545700977), (-10.4902, -4.287470133))
            Line((-10.4902, -4.287470133), (-10.4902, -6.402089023))
            ThreePointArc((-10.4902, -6.402089023), (-9.856394933, -7.351113629), (-8.736962546, -7.129240479))
            Line((-8.736962546, -7.129240479), (-5.440484187, -3.838768792))
            ThreePointArc((-5.440484187, -3.838768792), (-4.75073678, -2.808015636), (-4.5085, -1.591658411))
            Line((-4.5085, -1.591658411), (-4.5085, 1.591658411))
            ThreePointArc((-4.5085, 1.591658411), (-4.75073678, 2.808015636), (-5.440484187, 3.838768792))
            Line((-5.440484187, 3.838768792), (-8.736962546, 7.129240479))
            ThreePointArc((-8.736962546, 7.129240479), (-9.856394933, 7.351113629), (-10.4902, 6.402089023))
            Line((-10.4902, 6.402089023), (-10.4902, 4.287470133))
            ThreePointArc((-10.4902, 4.287470133), (-10.797450844, 3.545700977), (-11.53922, 3.238450133))
            Line((-11.53922, 3.238450133), (-11.65098, 3.238450133))
            ThreePointArc((-11.65098, 3.238450133), (-12.392749156, 3.545700977), (-12.7, 4.287470133))
            Line((-12.7, 4.287470133), (-12.7, 5.3171344))
            ThreePointArc((-12.7, 5.3171344), (-12.192, 5.8251344), (-12.7, 6.3331344))
            Line((-12.7, 6.3331344), (-12.7, 9.5504))
            ThreePointArc((-12.7, 9.5504), (-12.192000006, 10.058323491), (-12.699846982, 10.566399977))
            ThreePointArc((-12.699846982, 10.566399977), (-12.082522516, 12.082522516), (-10.566399977, 12.699846982))
            ThreePointArc((-10.566399977, 12.699846982), (-10.058323491, 12.192000006), (-9.5504, 12.7))
            Line((-9.5504, 12.7), (-6.3330836, 12.7))
            ThreePointArc((-6.3330836, 12.7), (-5.8250836, 12.192), (-5.3170836, 12.7))
            Line((-5.3170836, 12.7), (-4.2874692, 12.7))
            ThreePointArc((-4.2874692, 12.7), (-3.545700044, 12.392749156), (-3.2384492, 11.65098))
            Line((-3.2384492, 11.65098), (-3.2384492, 11.53922))
            ThreePointArc((-3.2384492, 11.53922), (-3.545700044, 10.797450844), (-4.2874692, 10.4902))
            Line((-4.2874692, 10.4902), (-6.476774195, 10.4902))
            ThreePointArc((-6.476774195, 10.4902), (-7.43216212, 9.851515102), (-7.207191475, 8.724540082))
        make_face()
        Circle(SKETCH1_R, mode=Mode.SUBTRACT)
    extrude(amount=-EXTRUDE1_DEPTH)


solid = part.part
